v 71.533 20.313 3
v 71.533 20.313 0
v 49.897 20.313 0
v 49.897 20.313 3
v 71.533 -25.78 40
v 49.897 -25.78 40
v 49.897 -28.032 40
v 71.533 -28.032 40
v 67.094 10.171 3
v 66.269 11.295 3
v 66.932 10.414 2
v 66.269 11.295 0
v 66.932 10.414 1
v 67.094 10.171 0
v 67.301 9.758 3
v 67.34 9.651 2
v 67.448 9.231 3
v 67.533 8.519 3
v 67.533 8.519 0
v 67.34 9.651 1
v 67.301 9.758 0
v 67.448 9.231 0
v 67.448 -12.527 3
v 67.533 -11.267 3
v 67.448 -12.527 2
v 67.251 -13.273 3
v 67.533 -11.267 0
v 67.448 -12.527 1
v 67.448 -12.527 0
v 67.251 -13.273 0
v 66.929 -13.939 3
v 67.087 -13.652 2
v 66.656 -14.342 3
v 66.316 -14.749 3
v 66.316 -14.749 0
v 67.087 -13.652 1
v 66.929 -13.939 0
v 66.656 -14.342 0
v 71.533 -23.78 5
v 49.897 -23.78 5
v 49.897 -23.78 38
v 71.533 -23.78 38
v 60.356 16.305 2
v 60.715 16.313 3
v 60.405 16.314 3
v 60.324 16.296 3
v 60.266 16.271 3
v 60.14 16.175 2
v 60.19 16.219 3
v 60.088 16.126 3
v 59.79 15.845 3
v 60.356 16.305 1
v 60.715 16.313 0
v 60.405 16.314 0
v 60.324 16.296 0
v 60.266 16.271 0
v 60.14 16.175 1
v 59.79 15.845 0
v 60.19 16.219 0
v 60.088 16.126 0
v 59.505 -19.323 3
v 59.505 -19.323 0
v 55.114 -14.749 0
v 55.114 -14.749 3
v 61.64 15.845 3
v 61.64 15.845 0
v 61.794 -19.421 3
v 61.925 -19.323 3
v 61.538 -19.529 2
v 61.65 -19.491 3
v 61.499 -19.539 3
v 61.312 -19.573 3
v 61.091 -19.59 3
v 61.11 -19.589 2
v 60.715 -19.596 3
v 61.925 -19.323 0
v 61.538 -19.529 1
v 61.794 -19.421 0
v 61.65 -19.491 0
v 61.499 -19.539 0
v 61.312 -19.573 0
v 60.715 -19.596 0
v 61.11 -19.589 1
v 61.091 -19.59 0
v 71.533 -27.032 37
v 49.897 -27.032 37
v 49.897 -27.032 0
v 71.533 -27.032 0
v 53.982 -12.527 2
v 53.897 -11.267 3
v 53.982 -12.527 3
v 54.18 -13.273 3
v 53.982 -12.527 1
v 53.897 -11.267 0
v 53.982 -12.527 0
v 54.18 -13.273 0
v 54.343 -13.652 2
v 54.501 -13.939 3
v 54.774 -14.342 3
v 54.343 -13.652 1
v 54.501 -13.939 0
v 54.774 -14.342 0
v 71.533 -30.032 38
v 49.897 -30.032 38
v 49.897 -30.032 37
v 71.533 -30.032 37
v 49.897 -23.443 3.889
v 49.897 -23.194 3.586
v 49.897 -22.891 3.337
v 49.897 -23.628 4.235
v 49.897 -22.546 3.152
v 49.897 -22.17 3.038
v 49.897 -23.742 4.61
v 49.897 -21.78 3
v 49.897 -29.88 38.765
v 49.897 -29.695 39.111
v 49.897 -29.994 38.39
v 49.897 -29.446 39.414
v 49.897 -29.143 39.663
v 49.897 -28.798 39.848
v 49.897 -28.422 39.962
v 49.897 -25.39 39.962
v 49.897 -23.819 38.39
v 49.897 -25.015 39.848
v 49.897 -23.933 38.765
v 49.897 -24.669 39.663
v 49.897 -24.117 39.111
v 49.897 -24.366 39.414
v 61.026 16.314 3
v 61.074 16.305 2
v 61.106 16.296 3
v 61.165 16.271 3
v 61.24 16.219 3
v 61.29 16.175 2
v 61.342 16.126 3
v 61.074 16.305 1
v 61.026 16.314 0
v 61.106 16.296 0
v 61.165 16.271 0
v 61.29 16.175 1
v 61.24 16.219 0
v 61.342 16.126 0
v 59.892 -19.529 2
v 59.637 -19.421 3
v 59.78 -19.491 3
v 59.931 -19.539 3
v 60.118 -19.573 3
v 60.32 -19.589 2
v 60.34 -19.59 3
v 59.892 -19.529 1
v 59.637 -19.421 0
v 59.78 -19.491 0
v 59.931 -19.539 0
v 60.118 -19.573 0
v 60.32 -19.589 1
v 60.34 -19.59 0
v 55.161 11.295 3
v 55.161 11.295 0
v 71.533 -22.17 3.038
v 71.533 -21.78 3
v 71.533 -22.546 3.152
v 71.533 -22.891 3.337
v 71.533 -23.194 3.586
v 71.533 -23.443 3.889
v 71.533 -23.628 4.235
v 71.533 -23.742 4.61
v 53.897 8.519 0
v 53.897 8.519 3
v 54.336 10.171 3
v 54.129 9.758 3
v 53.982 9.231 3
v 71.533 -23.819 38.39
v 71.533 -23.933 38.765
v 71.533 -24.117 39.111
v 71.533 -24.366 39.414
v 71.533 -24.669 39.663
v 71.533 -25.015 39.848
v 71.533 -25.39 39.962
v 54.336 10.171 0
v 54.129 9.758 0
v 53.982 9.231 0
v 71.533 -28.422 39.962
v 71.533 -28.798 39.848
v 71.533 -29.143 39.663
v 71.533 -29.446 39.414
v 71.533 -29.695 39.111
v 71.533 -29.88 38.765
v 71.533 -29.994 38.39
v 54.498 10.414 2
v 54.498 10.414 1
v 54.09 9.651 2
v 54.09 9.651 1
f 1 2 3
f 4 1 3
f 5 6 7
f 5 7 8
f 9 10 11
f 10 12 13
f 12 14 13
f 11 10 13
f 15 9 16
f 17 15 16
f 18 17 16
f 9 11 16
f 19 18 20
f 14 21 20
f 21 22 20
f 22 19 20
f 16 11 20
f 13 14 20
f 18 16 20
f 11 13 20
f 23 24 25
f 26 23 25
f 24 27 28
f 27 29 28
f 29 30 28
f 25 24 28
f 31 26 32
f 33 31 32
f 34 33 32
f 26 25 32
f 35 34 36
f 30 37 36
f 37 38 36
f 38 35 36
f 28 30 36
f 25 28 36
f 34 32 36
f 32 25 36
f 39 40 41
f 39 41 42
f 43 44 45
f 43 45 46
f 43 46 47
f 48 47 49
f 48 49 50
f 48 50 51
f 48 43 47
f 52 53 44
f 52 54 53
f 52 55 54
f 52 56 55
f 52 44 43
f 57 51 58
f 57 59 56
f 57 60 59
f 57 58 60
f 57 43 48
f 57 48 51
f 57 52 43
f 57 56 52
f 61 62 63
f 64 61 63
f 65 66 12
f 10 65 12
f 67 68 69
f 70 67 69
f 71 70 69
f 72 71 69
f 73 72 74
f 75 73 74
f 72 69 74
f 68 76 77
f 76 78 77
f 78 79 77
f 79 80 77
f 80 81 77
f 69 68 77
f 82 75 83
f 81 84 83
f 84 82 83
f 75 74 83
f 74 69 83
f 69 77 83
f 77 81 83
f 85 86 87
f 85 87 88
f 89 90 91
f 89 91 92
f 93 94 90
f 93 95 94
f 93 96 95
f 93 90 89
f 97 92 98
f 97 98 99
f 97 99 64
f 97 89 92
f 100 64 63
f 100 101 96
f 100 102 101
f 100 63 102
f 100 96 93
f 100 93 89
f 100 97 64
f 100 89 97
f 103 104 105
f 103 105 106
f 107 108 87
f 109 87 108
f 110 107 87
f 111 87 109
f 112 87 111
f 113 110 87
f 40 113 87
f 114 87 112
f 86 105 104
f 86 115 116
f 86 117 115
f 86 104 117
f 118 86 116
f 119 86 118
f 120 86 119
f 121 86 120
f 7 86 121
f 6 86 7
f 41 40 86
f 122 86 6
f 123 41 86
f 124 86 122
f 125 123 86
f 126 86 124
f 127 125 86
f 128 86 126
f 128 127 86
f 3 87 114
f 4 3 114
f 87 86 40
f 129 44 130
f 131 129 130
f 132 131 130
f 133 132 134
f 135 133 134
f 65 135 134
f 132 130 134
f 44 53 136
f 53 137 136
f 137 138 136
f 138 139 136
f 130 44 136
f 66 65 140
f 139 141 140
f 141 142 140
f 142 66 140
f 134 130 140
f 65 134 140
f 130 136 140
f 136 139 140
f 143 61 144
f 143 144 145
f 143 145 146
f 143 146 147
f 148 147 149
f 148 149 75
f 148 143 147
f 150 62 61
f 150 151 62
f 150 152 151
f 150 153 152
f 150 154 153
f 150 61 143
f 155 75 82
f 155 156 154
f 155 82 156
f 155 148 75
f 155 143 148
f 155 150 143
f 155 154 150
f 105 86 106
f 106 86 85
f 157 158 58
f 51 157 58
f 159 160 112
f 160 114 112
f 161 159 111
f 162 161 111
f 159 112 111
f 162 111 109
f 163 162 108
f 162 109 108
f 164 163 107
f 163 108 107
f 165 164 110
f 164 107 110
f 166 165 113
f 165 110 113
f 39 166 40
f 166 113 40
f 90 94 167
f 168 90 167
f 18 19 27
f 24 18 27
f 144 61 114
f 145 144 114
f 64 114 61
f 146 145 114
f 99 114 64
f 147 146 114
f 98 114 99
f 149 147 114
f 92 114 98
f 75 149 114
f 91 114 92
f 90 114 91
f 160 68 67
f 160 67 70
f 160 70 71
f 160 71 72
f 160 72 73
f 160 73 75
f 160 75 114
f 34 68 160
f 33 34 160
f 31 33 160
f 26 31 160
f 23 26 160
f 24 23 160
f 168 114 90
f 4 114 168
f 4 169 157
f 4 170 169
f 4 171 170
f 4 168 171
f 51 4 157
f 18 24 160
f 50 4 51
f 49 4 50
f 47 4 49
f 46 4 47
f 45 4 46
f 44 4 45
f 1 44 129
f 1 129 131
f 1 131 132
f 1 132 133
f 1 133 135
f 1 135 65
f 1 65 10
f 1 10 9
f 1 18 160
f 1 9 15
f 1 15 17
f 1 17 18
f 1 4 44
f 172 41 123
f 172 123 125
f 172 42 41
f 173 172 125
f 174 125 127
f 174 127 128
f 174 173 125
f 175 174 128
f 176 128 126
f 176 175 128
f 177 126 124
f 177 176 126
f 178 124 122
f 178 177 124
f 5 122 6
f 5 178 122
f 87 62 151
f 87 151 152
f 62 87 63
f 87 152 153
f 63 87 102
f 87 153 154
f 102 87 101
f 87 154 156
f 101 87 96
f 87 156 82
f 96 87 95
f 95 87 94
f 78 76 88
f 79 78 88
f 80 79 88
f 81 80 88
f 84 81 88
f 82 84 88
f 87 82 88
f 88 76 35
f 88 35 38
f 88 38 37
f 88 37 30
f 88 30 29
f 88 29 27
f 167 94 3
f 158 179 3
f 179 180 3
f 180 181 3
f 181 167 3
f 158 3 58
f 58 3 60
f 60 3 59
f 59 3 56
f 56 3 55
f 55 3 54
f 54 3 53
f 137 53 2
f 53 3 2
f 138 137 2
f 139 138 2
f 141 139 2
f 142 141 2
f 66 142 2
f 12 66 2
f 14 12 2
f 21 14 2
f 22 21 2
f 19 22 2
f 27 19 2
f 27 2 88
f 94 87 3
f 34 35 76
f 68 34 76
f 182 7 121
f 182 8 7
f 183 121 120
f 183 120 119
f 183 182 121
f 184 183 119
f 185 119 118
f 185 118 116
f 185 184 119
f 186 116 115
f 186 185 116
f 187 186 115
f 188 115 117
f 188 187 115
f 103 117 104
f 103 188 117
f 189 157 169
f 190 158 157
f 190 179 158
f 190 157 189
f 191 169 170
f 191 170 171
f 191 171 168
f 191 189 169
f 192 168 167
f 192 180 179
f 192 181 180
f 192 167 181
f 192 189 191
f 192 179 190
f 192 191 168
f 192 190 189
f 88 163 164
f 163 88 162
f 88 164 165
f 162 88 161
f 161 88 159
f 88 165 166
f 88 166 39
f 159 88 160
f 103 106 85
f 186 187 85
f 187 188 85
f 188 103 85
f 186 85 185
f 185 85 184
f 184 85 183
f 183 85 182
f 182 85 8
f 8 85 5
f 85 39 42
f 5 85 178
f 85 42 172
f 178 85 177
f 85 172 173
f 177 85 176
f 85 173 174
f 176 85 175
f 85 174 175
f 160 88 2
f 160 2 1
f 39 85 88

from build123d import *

# Parameters (mm, degrees)
F0_W     = 21.635506
F0_H     = 3.251886
F1_DEPTH = 3
F2_DEPTH = 40
F3_W     = 21.635506
F3_H     = 3
F4_DEPTH = 3
F5_R     = 2


with BuildPart() as f1:
    # F0 (on Top) → F1 (new body)
    with BuildSketch(Plane.XY):
        Polygon((71.532905, -23.780284), (71.532905, -23.03217), (71.532905, 20.313235), (60.715152, 20.313235), (49.897399, 20.313235), (49.897399, -23.03217), (49.897399, -23.780284), align=None)
        with BuildLine():
            add(Edge.make_bspline(
                [(60.715152, 16.313235), (60.19191, 16.340598), (60.299679, 16.300383), (59.789945, 15.845333)],
                knots=[0, 0, 0, 0, 1.036794, 1.036794, 1.036794, 1.036794], degree=3))
            add(Edge.make_bspline(
                [(60.715152, 16.313235), (61.238394, 16.340598), (61.130624, 16.300383), (61.640359, 15.845333)],
                knots=[0, 0, 0, 0, 1.036794, 1.036794, 1.036794, 1.036794], degree=3))
            Line((61.640359, 15.845333), (66.269247, 11.295008))
            add(Edge.make_bspline(
                [(66.269247, 11.295008), (67.073074, 10.193584), (67.434184, 9.998059), (67.532905, 8.518658)],
                knots=[0, 0, 0, 0, 3.050401, 3.050401, 3.050401, 3.050401], degree=3))
            Line((67.532905, 8.518658), (67.532905, -11.267474))
            add(Edge.make_bspline(
                [(67.532905, -11.267474), (67.542302, -12.628771), (67.336095, -13.63057), (66.316183, -14.749149)],
                knots=[0, 0, 0, 0, 3.688154, 3.688154, 3.688154, 3.688154], degree=3))
            Line((66.316183, -14.749149), (61.925017, -19.323452))
            add(Edge.make_bspline(
                [(61.925017, -19.323452), (61.584013, -19.632298), (61.069199, -19.584967), (60.715152, -19.595665)],
                knots=[0, 0, 0, 0, 1.240111, 1.240111, 1.240111, 1.240111], degree=3))
            add(Edge.make_bspline(
                [(59.505286, -19.323452), (59.846291, -19.632298), (60.361105, -19.584967), (60.715152, -19.595665)],
                knots=[0, 0, 0, 0, 1.240111, 1.240111, 1.240111, 1.240111], degree=3))
            Line((59.505286, -19.323452), (55.114121, -14.749149))
            add(Edge.make_bspline(
                [(53.897399, -11.267474), (53.888002, -12.628771), (54.094209, -13.63057), (55.114121, -14.749149)],
                knots=[0, 0, 0, 0, 3.688154, 3.688154, 3.688154, 3.688154], degree=3))
            Line((53.897399, -11.267474), (53.897399, 8.518658))
            add(Edge.make_bspline(
                [(55.161057, 11.295008), (54.35723, 10.193584), (53.99612, 9.998059), (53.897399, 8.518658)],
                knots=[0, 0, 0, 0, 3.050401, 3.050401, 3.050401, 3.050401], degree=3))
            Line((55.161057, 11.295008), (59.789945, 15.845333))
        make_face(mode=Mode.SUBTRACT)
        with Locations((60.715152, -25.406227)):
            Rectangle(F0_W, F0_H)
    extrude(amount=F1_DEPTH)

    # F0 (on Top) → F2 (join)
    with BuildSketch(Plane.XY):
        with Locations((60.715152, -25.406227)):
            Rectangle(F0_W, F0_H)
    extrude(amount=F2_DEPTH)

    # F3 (on face) → F4 (join)
    with BuildSketch(Plane.XZ.offset(27.03217)):
        with Locations((60.715152, 38.5)):
            Rectangle(F3_W, F3_H)
    extrude(amount=F4_DEPTH)

    # F5
    f5_edges = [f1.edges().sort_by_distance(p)[0] for p in [
        (60.715152, -30.03217, 40),
        (60.715152, -23.780284, 40),
        (60.715152, -23.780284, 3),
    ]]
    fillet(f5_edges, radius=F5_R)


solid = f1.part
